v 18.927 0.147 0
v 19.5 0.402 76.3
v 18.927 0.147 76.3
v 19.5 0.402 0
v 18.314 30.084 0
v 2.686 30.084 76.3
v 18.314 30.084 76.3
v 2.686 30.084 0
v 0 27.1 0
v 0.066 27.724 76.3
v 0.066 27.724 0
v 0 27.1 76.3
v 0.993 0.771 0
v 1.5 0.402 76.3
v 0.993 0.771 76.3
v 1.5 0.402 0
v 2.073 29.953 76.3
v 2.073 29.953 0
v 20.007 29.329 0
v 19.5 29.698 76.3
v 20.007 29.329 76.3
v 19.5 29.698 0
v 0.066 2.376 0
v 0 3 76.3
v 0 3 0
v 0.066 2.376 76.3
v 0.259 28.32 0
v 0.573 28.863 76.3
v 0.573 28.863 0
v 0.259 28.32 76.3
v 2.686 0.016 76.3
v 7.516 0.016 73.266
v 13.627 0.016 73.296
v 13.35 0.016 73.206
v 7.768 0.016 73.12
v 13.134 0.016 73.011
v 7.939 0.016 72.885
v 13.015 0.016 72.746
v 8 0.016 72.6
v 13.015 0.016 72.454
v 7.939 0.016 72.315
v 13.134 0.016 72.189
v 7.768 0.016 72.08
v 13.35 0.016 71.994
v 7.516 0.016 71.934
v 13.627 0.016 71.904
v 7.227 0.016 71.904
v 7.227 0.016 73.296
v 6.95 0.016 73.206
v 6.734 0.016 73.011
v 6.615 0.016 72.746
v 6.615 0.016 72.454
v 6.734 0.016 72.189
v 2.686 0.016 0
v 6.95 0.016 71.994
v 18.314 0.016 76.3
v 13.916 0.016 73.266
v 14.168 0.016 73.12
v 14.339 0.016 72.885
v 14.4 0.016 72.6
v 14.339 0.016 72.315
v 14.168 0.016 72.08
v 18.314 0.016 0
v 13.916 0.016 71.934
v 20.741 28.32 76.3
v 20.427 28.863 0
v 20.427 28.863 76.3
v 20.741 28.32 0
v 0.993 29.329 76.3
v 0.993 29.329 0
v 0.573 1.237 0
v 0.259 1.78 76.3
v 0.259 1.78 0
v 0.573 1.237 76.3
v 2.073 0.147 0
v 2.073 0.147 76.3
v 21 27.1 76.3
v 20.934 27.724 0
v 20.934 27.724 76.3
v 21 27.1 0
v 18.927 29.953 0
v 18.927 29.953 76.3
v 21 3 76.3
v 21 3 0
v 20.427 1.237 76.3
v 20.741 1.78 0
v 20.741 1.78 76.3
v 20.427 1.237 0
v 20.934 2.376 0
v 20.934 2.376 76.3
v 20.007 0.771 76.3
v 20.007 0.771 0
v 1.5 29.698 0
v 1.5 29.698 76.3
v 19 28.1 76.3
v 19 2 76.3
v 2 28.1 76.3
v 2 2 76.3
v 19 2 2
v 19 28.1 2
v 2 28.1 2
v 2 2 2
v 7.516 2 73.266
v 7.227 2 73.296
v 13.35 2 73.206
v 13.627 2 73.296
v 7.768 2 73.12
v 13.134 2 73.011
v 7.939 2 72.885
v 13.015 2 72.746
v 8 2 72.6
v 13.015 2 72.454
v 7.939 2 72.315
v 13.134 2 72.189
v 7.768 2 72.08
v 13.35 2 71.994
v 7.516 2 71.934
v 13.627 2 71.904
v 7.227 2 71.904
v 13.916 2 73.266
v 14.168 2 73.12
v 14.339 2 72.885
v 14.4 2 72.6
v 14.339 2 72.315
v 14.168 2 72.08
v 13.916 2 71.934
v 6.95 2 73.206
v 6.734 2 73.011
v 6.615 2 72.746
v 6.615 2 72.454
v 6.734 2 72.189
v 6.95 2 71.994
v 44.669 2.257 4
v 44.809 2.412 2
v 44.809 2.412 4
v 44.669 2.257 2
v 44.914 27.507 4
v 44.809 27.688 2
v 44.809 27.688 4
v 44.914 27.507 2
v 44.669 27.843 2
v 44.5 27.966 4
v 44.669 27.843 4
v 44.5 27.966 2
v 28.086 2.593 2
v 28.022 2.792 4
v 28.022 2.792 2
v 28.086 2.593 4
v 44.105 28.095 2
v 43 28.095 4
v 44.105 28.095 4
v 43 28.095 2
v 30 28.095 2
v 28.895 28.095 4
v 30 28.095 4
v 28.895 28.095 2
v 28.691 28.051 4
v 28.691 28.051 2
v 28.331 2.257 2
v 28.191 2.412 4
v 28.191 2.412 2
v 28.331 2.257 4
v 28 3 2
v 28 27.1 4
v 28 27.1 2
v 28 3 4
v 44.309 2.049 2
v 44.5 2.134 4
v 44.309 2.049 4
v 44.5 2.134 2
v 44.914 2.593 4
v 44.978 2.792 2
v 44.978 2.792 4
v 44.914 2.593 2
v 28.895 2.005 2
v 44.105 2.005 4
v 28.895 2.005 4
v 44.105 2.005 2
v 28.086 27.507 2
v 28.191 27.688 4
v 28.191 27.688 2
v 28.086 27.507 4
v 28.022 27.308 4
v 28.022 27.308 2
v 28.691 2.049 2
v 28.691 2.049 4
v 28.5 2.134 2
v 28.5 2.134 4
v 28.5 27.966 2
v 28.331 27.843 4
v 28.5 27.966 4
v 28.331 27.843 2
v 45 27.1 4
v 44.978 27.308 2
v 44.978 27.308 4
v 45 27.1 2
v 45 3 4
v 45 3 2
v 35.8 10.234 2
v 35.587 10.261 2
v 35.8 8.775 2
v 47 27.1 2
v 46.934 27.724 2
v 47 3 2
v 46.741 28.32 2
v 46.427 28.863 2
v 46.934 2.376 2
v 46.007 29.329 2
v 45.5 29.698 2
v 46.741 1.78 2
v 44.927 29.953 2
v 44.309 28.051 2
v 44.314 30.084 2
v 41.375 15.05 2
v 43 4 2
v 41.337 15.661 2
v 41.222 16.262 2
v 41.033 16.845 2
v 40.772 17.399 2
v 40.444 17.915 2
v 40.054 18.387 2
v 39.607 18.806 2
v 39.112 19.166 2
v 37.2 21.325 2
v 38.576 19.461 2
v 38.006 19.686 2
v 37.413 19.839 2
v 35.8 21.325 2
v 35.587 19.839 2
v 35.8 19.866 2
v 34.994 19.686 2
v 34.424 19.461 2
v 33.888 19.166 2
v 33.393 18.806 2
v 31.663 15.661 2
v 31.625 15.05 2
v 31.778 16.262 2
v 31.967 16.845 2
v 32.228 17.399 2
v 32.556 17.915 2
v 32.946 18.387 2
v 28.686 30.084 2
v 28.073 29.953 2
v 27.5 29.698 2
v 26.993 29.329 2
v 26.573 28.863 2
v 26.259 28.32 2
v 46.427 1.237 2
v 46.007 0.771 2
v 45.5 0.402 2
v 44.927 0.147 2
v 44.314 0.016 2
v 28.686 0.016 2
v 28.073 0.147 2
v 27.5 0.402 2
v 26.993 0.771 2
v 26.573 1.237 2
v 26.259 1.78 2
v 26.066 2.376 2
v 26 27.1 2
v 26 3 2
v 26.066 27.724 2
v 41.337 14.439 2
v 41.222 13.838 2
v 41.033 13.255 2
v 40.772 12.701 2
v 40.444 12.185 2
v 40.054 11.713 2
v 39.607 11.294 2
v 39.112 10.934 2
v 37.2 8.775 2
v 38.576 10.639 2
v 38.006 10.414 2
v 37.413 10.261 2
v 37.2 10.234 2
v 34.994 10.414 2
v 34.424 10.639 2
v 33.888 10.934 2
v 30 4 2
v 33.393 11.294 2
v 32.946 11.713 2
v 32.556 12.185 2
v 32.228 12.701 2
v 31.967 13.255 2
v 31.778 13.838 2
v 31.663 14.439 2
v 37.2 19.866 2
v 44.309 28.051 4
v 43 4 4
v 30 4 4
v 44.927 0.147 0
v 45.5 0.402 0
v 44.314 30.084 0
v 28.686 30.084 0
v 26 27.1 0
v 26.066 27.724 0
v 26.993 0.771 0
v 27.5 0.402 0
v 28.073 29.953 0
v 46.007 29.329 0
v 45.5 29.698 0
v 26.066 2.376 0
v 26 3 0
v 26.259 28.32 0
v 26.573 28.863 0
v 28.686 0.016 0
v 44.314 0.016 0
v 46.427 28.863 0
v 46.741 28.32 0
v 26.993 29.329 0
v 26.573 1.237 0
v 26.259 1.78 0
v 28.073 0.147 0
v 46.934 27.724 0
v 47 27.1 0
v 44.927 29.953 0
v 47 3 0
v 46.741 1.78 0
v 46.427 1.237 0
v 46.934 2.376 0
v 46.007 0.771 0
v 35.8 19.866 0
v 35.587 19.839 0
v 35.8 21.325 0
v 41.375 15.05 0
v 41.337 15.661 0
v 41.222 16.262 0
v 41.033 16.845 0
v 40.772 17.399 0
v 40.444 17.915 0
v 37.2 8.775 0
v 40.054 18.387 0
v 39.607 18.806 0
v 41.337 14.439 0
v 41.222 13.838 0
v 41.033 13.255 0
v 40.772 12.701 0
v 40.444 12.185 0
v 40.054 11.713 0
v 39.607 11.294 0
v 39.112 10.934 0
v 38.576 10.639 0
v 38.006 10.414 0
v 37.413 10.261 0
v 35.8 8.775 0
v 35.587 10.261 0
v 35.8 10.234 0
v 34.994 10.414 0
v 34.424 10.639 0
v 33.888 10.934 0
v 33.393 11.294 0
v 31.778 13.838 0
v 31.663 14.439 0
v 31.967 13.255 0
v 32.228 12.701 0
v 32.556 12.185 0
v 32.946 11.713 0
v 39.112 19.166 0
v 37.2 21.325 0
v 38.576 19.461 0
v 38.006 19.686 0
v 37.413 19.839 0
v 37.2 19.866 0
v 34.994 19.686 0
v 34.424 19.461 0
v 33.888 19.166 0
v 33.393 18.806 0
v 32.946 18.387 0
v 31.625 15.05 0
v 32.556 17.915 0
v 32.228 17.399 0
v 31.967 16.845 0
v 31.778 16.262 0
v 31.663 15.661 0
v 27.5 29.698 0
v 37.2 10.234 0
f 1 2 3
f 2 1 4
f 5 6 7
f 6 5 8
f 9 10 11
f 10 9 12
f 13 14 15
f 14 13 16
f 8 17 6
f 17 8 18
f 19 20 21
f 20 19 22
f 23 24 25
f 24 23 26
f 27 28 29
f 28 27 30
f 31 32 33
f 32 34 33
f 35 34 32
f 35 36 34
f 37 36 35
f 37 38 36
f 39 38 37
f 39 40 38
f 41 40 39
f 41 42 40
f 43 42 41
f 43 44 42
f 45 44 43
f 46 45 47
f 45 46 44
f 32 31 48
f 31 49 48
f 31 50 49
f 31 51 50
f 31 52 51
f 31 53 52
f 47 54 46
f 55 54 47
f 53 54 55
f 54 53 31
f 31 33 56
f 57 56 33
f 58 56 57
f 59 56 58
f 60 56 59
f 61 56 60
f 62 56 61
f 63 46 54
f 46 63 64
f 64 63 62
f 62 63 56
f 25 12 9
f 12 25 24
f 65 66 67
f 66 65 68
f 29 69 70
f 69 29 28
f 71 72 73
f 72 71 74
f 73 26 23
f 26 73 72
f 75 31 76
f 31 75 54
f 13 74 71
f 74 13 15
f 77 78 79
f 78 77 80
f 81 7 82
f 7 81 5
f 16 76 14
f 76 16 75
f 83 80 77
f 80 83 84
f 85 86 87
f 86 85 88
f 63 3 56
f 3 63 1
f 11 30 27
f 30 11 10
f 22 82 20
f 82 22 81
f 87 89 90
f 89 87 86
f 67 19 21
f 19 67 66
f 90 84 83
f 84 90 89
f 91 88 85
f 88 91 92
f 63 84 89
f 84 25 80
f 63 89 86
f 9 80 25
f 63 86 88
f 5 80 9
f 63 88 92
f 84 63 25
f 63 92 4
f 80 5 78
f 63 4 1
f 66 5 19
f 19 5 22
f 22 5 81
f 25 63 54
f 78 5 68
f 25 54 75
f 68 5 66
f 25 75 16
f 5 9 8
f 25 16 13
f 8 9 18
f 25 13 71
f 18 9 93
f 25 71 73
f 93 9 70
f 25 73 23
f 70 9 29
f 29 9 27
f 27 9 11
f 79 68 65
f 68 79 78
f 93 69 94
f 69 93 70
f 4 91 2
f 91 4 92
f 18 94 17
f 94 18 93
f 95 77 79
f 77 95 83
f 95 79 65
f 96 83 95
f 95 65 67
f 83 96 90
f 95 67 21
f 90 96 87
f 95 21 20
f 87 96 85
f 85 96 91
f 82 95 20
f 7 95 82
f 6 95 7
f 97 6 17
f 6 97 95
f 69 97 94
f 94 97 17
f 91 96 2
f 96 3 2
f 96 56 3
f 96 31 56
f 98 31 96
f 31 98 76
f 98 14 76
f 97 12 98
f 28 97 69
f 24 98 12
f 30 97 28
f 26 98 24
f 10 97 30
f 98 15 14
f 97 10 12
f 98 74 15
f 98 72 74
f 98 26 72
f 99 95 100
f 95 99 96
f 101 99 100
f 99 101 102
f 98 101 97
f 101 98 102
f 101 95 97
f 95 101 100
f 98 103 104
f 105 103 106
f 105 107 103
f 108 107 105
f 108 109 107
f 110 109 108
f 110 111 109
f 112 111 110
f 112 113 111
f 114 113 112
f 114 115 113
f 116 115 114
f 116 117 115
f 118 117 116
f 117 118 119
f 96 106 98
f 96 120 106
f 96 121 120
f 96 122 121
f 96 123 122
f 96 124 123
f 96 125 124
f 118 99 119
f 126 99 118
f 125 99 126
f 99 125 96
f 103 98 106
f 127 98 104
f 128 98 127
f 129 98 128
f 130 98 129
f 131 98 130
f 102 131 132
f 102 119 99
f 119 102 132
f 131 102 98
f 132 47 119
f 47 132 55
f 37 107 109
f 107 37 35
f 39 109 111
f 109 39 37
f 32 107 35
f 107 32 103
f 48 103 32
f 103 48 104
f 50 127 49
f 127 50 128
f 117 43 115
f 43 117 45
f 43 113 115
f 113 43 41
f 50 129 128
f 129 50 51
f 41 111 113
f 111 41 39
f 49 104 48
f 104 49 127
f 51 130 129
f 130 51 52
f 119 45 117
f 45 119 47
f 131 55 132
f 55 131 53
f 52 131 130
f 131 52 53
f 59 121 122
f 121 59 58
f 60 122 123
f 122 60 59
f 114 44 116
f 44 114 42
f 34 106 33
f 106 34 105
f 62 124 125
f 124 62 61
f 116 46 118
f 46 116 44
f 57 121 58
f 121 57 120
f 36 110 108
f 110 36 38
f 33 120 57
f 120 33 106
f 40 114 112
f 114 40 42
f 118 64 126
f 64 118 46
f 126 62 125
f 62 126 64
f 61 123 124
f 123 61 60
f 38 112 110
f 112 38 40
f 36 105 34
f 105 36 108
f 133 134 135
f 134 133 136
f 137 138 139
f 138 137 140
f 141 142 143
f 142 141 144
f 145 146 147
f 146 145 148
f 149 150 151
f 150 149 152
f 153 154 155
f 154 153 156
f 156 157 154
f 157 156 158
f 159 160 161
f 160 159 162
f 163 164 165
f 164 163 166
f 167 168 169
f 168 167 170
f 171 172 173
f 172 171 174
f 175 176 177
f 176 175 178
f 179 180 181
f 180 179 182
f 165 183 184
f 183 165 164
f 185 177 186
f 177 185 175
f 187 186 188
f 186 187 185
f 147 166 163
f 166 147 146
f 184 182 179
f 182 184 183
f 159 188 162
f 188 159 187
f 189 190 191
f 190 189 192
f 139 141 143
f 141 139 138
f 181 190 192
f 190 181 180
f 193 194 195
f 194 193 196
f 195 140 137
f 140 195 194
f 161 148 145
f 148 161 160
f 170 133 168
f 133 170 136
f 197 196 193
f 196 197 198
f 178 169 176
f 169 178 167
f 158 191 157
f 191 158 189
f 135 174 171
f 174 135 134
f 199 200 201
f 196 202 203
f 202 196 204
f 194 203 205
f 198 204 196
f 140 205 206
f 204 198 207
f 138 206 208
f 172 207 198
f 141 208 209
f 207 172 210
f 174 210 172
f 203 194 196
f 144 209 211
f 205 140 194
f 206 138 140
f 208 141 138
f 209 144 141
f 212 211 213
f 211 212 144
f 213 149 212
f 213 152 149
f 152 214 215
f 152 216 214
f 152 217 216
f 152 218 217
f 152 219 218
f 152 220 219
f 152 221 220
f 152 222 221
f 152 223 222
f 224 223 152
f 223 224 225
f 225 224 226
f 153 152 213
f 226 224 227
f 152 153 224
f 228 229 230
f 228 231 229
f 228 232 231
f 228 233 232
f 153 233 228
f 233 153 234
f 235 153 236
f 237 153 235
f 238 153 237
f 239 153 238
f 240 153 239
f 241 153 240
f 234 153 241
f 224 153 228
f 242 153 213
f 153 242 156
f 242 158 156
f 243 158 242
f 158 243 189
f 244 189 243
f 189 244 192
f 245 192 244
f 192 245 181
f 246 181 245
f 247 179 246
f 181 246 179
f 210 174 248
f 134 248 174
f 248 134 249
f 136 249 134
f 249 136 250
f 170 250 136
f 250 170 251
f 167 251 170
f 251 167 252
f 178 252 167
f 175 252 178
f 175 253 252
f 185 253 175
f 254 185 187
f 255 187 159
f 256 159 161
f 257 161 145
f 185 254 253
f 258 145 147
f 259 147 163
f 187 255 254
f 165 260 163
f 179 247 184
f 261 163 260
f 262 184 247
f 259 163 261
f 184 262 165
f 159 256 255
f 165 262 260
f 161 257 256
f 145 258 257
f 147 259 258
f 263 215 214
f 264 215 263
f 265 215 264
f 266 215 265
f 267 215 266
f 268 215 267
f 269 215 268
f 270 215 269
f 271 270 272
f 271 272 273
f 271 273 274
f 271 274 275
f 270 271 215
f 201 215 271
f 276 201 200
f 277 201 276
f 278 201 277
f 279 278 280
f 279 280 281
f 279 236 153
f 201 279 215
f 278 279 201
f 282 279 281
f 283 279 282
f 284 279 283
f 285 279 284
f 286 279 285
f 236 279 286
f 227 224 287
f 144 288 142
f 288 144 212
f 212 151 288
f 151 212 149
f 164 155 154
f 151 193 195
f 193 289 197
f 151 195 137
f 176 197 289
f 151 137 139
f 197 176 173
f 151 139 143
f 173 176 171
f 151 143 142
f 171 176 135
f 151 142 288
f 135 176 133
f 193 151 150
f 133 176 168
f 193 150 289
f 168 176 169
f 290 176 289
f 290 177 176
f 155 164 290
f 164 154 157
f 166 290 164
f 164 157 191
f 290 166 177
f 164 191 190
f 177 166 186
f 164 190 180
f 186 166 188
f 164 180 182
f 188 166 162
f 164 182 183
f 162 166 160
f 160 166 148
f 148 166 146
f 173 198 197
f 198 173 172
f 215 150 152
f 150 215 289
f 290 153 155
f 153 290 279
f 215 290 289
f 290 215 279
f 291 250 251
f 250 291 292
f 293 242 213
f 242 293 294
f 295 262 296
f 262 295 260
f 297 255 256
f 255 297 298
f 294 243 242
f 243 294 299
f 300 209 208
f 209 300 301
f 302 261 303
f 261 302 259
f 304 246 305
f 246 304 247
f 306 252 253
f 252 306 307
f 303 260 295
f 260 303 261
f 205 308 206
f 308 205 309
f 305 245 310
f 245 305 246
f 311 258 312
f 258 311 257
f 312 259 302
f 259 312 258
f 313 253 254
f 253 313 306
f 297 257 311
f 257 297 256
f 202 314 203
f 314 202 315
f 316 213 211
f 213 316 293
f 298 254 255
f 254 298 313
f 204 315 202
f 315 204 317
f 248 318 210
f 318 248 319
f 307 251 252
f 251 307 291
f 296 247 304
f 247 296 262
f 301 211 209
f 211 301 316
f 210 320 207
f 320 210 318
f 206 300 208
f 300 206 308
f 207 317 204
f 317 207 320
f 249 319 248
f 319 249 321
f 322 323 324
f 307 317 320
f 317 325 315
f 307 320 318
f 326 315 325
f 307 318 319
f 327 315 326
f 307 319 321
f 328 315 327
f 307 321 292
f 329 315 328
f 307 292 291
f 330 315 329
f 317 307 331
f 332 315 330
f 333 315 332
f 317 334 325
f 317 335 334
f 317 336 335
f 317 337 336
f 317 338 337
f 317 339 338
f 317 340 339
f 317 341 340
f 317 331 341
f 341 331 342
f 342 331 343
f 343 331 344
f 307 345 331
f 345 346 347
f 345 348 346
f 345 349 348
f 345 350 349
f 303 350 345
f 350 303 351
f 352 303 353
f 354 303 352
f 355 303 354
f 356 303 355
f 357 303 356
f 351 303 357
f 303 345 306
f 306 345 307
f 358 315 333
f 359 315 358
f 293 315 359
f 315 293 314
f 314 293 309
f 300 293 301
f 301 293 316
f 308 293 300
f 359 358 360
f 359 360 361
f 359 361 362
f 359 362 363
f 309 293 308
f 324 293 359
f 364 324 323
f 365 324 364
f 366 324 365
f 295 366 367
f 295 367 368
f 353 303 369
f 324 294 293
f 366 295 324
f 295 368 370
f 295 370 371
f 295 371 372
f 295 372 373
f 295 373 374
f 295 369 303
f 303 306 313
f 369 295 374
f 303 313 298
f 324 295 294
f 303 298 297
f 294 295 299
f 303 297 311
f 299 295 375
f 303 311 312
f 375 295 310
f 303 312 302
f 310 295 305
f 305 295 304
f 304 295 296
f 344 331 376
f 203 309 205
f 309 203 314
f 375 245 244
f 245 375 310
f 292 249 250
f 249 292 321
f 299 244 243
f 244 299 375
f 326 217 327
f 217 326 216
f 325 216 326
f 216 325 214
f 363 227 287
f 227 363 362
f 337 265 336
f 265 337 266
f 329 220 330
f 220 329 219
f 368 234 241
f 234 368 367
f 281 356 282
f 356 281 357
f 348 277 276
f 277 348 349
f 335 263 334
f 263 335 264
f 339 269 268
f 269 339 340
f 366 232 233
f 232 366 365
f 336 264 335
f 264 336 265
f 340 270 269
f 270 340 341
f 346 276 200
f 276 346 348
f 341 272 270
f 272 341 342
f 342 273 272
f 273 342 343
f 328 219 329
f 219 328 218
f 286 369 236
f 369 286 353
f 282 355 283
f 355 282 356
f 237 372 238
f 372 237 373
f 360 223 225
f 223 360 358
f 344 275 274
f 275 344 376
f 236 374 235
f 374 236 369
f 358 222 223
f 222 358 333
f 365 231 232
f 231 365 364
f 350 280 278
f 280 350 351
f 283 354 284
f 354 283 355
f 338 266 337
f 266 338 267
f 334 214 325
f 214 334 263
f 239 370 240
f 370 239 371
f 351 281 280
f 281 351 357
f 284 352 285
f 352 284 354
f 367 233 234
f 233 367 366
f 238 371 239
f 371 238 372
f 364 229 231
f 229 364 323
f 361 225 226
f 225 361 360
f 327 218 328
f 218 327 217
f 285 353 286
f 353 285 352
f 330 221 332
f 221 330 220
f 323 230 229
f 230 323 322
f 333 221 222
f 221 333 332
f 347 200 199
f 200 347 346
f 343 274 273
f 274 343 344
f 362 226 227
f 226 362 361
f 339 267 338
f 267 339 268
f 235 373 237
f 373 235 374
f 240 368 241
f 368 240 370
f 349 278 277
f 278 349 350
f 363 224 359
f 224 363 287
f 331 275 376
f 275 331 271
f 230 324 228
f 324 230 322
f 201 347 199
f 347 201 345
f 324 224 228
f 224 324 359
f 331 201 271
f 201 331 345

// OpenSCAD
batt_w = 17;
batt_l = 26.1;
batt_h = 52.3;
shell_r = 3;
shell_t = 2;
lip_w = 2;
lip_h = 4;
wire_w = 1.4;
wire_s = 5;
wire_o = 5;
sw_d = 22;
sw_r = 4.875;
sw_nub_w = 1.4;

// Make a cube with four rounded sides.
module round_cube(xyz, r, center=false) {
    translate(center ? -[xyz[0] / 2, xyz[1] / 2, xyz[2] / 2] : [0, 0, 0]) hull() {
        translate([r,          r,          0]) cylinder(h=xyz[2], r=r);
        translate([r,          xyz[1] - r, 0]) cylinder(h=xyz[2], r=r);
        translate([xyz[0] - r, r,          0]) cylinder(h=xyz[2], r=r);
        translate([xyz[0] - r, xyz[1] - r, 0]) cylinder(h=xyz[2], r=r);
    }
}

module switch_hole(depth)
union() {
    cylinder(r=sw_r, h=depth);
    
    translate([0, 0, depth / 2])
    cube([sw_nub_w, (sw_r + sw_nub_w) * 2, depth], center=true);
}

module wire_holes(depth)
union() {
    translate([(wire_s + wire_w) / -2, 0, 0])
    cylinder(d=wire_w, h=depth, center=true);

    translate([(wire_s + wire_w) / 2, 0, 0])
    cylinder(d=wire_w, h=depth, center=true);
}

module shell_box()
difference() {
    body_w = batt_w + shell_t * 2;
    body_l = batt_l + shell_t * 2;
    body_h = batt_h + sw_d + shell_t;

    round_cube([body_w, body_l, body_h], shell_r);
    
    translate([shell_t, shell_t, shell_t])
    cube([batt_w, batt_l, batt_h + sw_d]);
}

module shell()
difference() {
    shell_box($fn=30);

    body_w = batt_w + shell_t * 2;
    body_h = batt_h + sw_d + shell_t;

    translate([body_w / 2, shell_t / 2, body_h - wire_w / 2 - wire_o + shell_t])
    rotate([90, 0, 0])
    wire_holes(shell_t, $fn=15);
}

module cover_solid()
union() {
    body_w = batt_w + shell_t * 2;
    body_l = batt_l + shell_t * 2;

    round_cube([body_w, body_l, shell_t], shell_r);
    
    translate([shell_t, shell_t, shell_t])
    difference() {
        round_cube([batt_w, batt_l, shell_t], 1);

        translate([lip_w, lip_w, 0])
        cube([batt_w - lip_w * 2, batt_l - lip_w, lip_h]);
    }
}

module cover()
difference() {
    body_w = batt_w + shell_t * 2;
    body_l = batt_l + shell_t * 2;

    cover_solid($fn=30);

    translate([body_w / 2, body_l / 2, 0])
    switch_hole(shell_t, $fn=50);
}

shell();

translate([batt_w + shell_t * 2 + 5, 0, 0])
cover();
